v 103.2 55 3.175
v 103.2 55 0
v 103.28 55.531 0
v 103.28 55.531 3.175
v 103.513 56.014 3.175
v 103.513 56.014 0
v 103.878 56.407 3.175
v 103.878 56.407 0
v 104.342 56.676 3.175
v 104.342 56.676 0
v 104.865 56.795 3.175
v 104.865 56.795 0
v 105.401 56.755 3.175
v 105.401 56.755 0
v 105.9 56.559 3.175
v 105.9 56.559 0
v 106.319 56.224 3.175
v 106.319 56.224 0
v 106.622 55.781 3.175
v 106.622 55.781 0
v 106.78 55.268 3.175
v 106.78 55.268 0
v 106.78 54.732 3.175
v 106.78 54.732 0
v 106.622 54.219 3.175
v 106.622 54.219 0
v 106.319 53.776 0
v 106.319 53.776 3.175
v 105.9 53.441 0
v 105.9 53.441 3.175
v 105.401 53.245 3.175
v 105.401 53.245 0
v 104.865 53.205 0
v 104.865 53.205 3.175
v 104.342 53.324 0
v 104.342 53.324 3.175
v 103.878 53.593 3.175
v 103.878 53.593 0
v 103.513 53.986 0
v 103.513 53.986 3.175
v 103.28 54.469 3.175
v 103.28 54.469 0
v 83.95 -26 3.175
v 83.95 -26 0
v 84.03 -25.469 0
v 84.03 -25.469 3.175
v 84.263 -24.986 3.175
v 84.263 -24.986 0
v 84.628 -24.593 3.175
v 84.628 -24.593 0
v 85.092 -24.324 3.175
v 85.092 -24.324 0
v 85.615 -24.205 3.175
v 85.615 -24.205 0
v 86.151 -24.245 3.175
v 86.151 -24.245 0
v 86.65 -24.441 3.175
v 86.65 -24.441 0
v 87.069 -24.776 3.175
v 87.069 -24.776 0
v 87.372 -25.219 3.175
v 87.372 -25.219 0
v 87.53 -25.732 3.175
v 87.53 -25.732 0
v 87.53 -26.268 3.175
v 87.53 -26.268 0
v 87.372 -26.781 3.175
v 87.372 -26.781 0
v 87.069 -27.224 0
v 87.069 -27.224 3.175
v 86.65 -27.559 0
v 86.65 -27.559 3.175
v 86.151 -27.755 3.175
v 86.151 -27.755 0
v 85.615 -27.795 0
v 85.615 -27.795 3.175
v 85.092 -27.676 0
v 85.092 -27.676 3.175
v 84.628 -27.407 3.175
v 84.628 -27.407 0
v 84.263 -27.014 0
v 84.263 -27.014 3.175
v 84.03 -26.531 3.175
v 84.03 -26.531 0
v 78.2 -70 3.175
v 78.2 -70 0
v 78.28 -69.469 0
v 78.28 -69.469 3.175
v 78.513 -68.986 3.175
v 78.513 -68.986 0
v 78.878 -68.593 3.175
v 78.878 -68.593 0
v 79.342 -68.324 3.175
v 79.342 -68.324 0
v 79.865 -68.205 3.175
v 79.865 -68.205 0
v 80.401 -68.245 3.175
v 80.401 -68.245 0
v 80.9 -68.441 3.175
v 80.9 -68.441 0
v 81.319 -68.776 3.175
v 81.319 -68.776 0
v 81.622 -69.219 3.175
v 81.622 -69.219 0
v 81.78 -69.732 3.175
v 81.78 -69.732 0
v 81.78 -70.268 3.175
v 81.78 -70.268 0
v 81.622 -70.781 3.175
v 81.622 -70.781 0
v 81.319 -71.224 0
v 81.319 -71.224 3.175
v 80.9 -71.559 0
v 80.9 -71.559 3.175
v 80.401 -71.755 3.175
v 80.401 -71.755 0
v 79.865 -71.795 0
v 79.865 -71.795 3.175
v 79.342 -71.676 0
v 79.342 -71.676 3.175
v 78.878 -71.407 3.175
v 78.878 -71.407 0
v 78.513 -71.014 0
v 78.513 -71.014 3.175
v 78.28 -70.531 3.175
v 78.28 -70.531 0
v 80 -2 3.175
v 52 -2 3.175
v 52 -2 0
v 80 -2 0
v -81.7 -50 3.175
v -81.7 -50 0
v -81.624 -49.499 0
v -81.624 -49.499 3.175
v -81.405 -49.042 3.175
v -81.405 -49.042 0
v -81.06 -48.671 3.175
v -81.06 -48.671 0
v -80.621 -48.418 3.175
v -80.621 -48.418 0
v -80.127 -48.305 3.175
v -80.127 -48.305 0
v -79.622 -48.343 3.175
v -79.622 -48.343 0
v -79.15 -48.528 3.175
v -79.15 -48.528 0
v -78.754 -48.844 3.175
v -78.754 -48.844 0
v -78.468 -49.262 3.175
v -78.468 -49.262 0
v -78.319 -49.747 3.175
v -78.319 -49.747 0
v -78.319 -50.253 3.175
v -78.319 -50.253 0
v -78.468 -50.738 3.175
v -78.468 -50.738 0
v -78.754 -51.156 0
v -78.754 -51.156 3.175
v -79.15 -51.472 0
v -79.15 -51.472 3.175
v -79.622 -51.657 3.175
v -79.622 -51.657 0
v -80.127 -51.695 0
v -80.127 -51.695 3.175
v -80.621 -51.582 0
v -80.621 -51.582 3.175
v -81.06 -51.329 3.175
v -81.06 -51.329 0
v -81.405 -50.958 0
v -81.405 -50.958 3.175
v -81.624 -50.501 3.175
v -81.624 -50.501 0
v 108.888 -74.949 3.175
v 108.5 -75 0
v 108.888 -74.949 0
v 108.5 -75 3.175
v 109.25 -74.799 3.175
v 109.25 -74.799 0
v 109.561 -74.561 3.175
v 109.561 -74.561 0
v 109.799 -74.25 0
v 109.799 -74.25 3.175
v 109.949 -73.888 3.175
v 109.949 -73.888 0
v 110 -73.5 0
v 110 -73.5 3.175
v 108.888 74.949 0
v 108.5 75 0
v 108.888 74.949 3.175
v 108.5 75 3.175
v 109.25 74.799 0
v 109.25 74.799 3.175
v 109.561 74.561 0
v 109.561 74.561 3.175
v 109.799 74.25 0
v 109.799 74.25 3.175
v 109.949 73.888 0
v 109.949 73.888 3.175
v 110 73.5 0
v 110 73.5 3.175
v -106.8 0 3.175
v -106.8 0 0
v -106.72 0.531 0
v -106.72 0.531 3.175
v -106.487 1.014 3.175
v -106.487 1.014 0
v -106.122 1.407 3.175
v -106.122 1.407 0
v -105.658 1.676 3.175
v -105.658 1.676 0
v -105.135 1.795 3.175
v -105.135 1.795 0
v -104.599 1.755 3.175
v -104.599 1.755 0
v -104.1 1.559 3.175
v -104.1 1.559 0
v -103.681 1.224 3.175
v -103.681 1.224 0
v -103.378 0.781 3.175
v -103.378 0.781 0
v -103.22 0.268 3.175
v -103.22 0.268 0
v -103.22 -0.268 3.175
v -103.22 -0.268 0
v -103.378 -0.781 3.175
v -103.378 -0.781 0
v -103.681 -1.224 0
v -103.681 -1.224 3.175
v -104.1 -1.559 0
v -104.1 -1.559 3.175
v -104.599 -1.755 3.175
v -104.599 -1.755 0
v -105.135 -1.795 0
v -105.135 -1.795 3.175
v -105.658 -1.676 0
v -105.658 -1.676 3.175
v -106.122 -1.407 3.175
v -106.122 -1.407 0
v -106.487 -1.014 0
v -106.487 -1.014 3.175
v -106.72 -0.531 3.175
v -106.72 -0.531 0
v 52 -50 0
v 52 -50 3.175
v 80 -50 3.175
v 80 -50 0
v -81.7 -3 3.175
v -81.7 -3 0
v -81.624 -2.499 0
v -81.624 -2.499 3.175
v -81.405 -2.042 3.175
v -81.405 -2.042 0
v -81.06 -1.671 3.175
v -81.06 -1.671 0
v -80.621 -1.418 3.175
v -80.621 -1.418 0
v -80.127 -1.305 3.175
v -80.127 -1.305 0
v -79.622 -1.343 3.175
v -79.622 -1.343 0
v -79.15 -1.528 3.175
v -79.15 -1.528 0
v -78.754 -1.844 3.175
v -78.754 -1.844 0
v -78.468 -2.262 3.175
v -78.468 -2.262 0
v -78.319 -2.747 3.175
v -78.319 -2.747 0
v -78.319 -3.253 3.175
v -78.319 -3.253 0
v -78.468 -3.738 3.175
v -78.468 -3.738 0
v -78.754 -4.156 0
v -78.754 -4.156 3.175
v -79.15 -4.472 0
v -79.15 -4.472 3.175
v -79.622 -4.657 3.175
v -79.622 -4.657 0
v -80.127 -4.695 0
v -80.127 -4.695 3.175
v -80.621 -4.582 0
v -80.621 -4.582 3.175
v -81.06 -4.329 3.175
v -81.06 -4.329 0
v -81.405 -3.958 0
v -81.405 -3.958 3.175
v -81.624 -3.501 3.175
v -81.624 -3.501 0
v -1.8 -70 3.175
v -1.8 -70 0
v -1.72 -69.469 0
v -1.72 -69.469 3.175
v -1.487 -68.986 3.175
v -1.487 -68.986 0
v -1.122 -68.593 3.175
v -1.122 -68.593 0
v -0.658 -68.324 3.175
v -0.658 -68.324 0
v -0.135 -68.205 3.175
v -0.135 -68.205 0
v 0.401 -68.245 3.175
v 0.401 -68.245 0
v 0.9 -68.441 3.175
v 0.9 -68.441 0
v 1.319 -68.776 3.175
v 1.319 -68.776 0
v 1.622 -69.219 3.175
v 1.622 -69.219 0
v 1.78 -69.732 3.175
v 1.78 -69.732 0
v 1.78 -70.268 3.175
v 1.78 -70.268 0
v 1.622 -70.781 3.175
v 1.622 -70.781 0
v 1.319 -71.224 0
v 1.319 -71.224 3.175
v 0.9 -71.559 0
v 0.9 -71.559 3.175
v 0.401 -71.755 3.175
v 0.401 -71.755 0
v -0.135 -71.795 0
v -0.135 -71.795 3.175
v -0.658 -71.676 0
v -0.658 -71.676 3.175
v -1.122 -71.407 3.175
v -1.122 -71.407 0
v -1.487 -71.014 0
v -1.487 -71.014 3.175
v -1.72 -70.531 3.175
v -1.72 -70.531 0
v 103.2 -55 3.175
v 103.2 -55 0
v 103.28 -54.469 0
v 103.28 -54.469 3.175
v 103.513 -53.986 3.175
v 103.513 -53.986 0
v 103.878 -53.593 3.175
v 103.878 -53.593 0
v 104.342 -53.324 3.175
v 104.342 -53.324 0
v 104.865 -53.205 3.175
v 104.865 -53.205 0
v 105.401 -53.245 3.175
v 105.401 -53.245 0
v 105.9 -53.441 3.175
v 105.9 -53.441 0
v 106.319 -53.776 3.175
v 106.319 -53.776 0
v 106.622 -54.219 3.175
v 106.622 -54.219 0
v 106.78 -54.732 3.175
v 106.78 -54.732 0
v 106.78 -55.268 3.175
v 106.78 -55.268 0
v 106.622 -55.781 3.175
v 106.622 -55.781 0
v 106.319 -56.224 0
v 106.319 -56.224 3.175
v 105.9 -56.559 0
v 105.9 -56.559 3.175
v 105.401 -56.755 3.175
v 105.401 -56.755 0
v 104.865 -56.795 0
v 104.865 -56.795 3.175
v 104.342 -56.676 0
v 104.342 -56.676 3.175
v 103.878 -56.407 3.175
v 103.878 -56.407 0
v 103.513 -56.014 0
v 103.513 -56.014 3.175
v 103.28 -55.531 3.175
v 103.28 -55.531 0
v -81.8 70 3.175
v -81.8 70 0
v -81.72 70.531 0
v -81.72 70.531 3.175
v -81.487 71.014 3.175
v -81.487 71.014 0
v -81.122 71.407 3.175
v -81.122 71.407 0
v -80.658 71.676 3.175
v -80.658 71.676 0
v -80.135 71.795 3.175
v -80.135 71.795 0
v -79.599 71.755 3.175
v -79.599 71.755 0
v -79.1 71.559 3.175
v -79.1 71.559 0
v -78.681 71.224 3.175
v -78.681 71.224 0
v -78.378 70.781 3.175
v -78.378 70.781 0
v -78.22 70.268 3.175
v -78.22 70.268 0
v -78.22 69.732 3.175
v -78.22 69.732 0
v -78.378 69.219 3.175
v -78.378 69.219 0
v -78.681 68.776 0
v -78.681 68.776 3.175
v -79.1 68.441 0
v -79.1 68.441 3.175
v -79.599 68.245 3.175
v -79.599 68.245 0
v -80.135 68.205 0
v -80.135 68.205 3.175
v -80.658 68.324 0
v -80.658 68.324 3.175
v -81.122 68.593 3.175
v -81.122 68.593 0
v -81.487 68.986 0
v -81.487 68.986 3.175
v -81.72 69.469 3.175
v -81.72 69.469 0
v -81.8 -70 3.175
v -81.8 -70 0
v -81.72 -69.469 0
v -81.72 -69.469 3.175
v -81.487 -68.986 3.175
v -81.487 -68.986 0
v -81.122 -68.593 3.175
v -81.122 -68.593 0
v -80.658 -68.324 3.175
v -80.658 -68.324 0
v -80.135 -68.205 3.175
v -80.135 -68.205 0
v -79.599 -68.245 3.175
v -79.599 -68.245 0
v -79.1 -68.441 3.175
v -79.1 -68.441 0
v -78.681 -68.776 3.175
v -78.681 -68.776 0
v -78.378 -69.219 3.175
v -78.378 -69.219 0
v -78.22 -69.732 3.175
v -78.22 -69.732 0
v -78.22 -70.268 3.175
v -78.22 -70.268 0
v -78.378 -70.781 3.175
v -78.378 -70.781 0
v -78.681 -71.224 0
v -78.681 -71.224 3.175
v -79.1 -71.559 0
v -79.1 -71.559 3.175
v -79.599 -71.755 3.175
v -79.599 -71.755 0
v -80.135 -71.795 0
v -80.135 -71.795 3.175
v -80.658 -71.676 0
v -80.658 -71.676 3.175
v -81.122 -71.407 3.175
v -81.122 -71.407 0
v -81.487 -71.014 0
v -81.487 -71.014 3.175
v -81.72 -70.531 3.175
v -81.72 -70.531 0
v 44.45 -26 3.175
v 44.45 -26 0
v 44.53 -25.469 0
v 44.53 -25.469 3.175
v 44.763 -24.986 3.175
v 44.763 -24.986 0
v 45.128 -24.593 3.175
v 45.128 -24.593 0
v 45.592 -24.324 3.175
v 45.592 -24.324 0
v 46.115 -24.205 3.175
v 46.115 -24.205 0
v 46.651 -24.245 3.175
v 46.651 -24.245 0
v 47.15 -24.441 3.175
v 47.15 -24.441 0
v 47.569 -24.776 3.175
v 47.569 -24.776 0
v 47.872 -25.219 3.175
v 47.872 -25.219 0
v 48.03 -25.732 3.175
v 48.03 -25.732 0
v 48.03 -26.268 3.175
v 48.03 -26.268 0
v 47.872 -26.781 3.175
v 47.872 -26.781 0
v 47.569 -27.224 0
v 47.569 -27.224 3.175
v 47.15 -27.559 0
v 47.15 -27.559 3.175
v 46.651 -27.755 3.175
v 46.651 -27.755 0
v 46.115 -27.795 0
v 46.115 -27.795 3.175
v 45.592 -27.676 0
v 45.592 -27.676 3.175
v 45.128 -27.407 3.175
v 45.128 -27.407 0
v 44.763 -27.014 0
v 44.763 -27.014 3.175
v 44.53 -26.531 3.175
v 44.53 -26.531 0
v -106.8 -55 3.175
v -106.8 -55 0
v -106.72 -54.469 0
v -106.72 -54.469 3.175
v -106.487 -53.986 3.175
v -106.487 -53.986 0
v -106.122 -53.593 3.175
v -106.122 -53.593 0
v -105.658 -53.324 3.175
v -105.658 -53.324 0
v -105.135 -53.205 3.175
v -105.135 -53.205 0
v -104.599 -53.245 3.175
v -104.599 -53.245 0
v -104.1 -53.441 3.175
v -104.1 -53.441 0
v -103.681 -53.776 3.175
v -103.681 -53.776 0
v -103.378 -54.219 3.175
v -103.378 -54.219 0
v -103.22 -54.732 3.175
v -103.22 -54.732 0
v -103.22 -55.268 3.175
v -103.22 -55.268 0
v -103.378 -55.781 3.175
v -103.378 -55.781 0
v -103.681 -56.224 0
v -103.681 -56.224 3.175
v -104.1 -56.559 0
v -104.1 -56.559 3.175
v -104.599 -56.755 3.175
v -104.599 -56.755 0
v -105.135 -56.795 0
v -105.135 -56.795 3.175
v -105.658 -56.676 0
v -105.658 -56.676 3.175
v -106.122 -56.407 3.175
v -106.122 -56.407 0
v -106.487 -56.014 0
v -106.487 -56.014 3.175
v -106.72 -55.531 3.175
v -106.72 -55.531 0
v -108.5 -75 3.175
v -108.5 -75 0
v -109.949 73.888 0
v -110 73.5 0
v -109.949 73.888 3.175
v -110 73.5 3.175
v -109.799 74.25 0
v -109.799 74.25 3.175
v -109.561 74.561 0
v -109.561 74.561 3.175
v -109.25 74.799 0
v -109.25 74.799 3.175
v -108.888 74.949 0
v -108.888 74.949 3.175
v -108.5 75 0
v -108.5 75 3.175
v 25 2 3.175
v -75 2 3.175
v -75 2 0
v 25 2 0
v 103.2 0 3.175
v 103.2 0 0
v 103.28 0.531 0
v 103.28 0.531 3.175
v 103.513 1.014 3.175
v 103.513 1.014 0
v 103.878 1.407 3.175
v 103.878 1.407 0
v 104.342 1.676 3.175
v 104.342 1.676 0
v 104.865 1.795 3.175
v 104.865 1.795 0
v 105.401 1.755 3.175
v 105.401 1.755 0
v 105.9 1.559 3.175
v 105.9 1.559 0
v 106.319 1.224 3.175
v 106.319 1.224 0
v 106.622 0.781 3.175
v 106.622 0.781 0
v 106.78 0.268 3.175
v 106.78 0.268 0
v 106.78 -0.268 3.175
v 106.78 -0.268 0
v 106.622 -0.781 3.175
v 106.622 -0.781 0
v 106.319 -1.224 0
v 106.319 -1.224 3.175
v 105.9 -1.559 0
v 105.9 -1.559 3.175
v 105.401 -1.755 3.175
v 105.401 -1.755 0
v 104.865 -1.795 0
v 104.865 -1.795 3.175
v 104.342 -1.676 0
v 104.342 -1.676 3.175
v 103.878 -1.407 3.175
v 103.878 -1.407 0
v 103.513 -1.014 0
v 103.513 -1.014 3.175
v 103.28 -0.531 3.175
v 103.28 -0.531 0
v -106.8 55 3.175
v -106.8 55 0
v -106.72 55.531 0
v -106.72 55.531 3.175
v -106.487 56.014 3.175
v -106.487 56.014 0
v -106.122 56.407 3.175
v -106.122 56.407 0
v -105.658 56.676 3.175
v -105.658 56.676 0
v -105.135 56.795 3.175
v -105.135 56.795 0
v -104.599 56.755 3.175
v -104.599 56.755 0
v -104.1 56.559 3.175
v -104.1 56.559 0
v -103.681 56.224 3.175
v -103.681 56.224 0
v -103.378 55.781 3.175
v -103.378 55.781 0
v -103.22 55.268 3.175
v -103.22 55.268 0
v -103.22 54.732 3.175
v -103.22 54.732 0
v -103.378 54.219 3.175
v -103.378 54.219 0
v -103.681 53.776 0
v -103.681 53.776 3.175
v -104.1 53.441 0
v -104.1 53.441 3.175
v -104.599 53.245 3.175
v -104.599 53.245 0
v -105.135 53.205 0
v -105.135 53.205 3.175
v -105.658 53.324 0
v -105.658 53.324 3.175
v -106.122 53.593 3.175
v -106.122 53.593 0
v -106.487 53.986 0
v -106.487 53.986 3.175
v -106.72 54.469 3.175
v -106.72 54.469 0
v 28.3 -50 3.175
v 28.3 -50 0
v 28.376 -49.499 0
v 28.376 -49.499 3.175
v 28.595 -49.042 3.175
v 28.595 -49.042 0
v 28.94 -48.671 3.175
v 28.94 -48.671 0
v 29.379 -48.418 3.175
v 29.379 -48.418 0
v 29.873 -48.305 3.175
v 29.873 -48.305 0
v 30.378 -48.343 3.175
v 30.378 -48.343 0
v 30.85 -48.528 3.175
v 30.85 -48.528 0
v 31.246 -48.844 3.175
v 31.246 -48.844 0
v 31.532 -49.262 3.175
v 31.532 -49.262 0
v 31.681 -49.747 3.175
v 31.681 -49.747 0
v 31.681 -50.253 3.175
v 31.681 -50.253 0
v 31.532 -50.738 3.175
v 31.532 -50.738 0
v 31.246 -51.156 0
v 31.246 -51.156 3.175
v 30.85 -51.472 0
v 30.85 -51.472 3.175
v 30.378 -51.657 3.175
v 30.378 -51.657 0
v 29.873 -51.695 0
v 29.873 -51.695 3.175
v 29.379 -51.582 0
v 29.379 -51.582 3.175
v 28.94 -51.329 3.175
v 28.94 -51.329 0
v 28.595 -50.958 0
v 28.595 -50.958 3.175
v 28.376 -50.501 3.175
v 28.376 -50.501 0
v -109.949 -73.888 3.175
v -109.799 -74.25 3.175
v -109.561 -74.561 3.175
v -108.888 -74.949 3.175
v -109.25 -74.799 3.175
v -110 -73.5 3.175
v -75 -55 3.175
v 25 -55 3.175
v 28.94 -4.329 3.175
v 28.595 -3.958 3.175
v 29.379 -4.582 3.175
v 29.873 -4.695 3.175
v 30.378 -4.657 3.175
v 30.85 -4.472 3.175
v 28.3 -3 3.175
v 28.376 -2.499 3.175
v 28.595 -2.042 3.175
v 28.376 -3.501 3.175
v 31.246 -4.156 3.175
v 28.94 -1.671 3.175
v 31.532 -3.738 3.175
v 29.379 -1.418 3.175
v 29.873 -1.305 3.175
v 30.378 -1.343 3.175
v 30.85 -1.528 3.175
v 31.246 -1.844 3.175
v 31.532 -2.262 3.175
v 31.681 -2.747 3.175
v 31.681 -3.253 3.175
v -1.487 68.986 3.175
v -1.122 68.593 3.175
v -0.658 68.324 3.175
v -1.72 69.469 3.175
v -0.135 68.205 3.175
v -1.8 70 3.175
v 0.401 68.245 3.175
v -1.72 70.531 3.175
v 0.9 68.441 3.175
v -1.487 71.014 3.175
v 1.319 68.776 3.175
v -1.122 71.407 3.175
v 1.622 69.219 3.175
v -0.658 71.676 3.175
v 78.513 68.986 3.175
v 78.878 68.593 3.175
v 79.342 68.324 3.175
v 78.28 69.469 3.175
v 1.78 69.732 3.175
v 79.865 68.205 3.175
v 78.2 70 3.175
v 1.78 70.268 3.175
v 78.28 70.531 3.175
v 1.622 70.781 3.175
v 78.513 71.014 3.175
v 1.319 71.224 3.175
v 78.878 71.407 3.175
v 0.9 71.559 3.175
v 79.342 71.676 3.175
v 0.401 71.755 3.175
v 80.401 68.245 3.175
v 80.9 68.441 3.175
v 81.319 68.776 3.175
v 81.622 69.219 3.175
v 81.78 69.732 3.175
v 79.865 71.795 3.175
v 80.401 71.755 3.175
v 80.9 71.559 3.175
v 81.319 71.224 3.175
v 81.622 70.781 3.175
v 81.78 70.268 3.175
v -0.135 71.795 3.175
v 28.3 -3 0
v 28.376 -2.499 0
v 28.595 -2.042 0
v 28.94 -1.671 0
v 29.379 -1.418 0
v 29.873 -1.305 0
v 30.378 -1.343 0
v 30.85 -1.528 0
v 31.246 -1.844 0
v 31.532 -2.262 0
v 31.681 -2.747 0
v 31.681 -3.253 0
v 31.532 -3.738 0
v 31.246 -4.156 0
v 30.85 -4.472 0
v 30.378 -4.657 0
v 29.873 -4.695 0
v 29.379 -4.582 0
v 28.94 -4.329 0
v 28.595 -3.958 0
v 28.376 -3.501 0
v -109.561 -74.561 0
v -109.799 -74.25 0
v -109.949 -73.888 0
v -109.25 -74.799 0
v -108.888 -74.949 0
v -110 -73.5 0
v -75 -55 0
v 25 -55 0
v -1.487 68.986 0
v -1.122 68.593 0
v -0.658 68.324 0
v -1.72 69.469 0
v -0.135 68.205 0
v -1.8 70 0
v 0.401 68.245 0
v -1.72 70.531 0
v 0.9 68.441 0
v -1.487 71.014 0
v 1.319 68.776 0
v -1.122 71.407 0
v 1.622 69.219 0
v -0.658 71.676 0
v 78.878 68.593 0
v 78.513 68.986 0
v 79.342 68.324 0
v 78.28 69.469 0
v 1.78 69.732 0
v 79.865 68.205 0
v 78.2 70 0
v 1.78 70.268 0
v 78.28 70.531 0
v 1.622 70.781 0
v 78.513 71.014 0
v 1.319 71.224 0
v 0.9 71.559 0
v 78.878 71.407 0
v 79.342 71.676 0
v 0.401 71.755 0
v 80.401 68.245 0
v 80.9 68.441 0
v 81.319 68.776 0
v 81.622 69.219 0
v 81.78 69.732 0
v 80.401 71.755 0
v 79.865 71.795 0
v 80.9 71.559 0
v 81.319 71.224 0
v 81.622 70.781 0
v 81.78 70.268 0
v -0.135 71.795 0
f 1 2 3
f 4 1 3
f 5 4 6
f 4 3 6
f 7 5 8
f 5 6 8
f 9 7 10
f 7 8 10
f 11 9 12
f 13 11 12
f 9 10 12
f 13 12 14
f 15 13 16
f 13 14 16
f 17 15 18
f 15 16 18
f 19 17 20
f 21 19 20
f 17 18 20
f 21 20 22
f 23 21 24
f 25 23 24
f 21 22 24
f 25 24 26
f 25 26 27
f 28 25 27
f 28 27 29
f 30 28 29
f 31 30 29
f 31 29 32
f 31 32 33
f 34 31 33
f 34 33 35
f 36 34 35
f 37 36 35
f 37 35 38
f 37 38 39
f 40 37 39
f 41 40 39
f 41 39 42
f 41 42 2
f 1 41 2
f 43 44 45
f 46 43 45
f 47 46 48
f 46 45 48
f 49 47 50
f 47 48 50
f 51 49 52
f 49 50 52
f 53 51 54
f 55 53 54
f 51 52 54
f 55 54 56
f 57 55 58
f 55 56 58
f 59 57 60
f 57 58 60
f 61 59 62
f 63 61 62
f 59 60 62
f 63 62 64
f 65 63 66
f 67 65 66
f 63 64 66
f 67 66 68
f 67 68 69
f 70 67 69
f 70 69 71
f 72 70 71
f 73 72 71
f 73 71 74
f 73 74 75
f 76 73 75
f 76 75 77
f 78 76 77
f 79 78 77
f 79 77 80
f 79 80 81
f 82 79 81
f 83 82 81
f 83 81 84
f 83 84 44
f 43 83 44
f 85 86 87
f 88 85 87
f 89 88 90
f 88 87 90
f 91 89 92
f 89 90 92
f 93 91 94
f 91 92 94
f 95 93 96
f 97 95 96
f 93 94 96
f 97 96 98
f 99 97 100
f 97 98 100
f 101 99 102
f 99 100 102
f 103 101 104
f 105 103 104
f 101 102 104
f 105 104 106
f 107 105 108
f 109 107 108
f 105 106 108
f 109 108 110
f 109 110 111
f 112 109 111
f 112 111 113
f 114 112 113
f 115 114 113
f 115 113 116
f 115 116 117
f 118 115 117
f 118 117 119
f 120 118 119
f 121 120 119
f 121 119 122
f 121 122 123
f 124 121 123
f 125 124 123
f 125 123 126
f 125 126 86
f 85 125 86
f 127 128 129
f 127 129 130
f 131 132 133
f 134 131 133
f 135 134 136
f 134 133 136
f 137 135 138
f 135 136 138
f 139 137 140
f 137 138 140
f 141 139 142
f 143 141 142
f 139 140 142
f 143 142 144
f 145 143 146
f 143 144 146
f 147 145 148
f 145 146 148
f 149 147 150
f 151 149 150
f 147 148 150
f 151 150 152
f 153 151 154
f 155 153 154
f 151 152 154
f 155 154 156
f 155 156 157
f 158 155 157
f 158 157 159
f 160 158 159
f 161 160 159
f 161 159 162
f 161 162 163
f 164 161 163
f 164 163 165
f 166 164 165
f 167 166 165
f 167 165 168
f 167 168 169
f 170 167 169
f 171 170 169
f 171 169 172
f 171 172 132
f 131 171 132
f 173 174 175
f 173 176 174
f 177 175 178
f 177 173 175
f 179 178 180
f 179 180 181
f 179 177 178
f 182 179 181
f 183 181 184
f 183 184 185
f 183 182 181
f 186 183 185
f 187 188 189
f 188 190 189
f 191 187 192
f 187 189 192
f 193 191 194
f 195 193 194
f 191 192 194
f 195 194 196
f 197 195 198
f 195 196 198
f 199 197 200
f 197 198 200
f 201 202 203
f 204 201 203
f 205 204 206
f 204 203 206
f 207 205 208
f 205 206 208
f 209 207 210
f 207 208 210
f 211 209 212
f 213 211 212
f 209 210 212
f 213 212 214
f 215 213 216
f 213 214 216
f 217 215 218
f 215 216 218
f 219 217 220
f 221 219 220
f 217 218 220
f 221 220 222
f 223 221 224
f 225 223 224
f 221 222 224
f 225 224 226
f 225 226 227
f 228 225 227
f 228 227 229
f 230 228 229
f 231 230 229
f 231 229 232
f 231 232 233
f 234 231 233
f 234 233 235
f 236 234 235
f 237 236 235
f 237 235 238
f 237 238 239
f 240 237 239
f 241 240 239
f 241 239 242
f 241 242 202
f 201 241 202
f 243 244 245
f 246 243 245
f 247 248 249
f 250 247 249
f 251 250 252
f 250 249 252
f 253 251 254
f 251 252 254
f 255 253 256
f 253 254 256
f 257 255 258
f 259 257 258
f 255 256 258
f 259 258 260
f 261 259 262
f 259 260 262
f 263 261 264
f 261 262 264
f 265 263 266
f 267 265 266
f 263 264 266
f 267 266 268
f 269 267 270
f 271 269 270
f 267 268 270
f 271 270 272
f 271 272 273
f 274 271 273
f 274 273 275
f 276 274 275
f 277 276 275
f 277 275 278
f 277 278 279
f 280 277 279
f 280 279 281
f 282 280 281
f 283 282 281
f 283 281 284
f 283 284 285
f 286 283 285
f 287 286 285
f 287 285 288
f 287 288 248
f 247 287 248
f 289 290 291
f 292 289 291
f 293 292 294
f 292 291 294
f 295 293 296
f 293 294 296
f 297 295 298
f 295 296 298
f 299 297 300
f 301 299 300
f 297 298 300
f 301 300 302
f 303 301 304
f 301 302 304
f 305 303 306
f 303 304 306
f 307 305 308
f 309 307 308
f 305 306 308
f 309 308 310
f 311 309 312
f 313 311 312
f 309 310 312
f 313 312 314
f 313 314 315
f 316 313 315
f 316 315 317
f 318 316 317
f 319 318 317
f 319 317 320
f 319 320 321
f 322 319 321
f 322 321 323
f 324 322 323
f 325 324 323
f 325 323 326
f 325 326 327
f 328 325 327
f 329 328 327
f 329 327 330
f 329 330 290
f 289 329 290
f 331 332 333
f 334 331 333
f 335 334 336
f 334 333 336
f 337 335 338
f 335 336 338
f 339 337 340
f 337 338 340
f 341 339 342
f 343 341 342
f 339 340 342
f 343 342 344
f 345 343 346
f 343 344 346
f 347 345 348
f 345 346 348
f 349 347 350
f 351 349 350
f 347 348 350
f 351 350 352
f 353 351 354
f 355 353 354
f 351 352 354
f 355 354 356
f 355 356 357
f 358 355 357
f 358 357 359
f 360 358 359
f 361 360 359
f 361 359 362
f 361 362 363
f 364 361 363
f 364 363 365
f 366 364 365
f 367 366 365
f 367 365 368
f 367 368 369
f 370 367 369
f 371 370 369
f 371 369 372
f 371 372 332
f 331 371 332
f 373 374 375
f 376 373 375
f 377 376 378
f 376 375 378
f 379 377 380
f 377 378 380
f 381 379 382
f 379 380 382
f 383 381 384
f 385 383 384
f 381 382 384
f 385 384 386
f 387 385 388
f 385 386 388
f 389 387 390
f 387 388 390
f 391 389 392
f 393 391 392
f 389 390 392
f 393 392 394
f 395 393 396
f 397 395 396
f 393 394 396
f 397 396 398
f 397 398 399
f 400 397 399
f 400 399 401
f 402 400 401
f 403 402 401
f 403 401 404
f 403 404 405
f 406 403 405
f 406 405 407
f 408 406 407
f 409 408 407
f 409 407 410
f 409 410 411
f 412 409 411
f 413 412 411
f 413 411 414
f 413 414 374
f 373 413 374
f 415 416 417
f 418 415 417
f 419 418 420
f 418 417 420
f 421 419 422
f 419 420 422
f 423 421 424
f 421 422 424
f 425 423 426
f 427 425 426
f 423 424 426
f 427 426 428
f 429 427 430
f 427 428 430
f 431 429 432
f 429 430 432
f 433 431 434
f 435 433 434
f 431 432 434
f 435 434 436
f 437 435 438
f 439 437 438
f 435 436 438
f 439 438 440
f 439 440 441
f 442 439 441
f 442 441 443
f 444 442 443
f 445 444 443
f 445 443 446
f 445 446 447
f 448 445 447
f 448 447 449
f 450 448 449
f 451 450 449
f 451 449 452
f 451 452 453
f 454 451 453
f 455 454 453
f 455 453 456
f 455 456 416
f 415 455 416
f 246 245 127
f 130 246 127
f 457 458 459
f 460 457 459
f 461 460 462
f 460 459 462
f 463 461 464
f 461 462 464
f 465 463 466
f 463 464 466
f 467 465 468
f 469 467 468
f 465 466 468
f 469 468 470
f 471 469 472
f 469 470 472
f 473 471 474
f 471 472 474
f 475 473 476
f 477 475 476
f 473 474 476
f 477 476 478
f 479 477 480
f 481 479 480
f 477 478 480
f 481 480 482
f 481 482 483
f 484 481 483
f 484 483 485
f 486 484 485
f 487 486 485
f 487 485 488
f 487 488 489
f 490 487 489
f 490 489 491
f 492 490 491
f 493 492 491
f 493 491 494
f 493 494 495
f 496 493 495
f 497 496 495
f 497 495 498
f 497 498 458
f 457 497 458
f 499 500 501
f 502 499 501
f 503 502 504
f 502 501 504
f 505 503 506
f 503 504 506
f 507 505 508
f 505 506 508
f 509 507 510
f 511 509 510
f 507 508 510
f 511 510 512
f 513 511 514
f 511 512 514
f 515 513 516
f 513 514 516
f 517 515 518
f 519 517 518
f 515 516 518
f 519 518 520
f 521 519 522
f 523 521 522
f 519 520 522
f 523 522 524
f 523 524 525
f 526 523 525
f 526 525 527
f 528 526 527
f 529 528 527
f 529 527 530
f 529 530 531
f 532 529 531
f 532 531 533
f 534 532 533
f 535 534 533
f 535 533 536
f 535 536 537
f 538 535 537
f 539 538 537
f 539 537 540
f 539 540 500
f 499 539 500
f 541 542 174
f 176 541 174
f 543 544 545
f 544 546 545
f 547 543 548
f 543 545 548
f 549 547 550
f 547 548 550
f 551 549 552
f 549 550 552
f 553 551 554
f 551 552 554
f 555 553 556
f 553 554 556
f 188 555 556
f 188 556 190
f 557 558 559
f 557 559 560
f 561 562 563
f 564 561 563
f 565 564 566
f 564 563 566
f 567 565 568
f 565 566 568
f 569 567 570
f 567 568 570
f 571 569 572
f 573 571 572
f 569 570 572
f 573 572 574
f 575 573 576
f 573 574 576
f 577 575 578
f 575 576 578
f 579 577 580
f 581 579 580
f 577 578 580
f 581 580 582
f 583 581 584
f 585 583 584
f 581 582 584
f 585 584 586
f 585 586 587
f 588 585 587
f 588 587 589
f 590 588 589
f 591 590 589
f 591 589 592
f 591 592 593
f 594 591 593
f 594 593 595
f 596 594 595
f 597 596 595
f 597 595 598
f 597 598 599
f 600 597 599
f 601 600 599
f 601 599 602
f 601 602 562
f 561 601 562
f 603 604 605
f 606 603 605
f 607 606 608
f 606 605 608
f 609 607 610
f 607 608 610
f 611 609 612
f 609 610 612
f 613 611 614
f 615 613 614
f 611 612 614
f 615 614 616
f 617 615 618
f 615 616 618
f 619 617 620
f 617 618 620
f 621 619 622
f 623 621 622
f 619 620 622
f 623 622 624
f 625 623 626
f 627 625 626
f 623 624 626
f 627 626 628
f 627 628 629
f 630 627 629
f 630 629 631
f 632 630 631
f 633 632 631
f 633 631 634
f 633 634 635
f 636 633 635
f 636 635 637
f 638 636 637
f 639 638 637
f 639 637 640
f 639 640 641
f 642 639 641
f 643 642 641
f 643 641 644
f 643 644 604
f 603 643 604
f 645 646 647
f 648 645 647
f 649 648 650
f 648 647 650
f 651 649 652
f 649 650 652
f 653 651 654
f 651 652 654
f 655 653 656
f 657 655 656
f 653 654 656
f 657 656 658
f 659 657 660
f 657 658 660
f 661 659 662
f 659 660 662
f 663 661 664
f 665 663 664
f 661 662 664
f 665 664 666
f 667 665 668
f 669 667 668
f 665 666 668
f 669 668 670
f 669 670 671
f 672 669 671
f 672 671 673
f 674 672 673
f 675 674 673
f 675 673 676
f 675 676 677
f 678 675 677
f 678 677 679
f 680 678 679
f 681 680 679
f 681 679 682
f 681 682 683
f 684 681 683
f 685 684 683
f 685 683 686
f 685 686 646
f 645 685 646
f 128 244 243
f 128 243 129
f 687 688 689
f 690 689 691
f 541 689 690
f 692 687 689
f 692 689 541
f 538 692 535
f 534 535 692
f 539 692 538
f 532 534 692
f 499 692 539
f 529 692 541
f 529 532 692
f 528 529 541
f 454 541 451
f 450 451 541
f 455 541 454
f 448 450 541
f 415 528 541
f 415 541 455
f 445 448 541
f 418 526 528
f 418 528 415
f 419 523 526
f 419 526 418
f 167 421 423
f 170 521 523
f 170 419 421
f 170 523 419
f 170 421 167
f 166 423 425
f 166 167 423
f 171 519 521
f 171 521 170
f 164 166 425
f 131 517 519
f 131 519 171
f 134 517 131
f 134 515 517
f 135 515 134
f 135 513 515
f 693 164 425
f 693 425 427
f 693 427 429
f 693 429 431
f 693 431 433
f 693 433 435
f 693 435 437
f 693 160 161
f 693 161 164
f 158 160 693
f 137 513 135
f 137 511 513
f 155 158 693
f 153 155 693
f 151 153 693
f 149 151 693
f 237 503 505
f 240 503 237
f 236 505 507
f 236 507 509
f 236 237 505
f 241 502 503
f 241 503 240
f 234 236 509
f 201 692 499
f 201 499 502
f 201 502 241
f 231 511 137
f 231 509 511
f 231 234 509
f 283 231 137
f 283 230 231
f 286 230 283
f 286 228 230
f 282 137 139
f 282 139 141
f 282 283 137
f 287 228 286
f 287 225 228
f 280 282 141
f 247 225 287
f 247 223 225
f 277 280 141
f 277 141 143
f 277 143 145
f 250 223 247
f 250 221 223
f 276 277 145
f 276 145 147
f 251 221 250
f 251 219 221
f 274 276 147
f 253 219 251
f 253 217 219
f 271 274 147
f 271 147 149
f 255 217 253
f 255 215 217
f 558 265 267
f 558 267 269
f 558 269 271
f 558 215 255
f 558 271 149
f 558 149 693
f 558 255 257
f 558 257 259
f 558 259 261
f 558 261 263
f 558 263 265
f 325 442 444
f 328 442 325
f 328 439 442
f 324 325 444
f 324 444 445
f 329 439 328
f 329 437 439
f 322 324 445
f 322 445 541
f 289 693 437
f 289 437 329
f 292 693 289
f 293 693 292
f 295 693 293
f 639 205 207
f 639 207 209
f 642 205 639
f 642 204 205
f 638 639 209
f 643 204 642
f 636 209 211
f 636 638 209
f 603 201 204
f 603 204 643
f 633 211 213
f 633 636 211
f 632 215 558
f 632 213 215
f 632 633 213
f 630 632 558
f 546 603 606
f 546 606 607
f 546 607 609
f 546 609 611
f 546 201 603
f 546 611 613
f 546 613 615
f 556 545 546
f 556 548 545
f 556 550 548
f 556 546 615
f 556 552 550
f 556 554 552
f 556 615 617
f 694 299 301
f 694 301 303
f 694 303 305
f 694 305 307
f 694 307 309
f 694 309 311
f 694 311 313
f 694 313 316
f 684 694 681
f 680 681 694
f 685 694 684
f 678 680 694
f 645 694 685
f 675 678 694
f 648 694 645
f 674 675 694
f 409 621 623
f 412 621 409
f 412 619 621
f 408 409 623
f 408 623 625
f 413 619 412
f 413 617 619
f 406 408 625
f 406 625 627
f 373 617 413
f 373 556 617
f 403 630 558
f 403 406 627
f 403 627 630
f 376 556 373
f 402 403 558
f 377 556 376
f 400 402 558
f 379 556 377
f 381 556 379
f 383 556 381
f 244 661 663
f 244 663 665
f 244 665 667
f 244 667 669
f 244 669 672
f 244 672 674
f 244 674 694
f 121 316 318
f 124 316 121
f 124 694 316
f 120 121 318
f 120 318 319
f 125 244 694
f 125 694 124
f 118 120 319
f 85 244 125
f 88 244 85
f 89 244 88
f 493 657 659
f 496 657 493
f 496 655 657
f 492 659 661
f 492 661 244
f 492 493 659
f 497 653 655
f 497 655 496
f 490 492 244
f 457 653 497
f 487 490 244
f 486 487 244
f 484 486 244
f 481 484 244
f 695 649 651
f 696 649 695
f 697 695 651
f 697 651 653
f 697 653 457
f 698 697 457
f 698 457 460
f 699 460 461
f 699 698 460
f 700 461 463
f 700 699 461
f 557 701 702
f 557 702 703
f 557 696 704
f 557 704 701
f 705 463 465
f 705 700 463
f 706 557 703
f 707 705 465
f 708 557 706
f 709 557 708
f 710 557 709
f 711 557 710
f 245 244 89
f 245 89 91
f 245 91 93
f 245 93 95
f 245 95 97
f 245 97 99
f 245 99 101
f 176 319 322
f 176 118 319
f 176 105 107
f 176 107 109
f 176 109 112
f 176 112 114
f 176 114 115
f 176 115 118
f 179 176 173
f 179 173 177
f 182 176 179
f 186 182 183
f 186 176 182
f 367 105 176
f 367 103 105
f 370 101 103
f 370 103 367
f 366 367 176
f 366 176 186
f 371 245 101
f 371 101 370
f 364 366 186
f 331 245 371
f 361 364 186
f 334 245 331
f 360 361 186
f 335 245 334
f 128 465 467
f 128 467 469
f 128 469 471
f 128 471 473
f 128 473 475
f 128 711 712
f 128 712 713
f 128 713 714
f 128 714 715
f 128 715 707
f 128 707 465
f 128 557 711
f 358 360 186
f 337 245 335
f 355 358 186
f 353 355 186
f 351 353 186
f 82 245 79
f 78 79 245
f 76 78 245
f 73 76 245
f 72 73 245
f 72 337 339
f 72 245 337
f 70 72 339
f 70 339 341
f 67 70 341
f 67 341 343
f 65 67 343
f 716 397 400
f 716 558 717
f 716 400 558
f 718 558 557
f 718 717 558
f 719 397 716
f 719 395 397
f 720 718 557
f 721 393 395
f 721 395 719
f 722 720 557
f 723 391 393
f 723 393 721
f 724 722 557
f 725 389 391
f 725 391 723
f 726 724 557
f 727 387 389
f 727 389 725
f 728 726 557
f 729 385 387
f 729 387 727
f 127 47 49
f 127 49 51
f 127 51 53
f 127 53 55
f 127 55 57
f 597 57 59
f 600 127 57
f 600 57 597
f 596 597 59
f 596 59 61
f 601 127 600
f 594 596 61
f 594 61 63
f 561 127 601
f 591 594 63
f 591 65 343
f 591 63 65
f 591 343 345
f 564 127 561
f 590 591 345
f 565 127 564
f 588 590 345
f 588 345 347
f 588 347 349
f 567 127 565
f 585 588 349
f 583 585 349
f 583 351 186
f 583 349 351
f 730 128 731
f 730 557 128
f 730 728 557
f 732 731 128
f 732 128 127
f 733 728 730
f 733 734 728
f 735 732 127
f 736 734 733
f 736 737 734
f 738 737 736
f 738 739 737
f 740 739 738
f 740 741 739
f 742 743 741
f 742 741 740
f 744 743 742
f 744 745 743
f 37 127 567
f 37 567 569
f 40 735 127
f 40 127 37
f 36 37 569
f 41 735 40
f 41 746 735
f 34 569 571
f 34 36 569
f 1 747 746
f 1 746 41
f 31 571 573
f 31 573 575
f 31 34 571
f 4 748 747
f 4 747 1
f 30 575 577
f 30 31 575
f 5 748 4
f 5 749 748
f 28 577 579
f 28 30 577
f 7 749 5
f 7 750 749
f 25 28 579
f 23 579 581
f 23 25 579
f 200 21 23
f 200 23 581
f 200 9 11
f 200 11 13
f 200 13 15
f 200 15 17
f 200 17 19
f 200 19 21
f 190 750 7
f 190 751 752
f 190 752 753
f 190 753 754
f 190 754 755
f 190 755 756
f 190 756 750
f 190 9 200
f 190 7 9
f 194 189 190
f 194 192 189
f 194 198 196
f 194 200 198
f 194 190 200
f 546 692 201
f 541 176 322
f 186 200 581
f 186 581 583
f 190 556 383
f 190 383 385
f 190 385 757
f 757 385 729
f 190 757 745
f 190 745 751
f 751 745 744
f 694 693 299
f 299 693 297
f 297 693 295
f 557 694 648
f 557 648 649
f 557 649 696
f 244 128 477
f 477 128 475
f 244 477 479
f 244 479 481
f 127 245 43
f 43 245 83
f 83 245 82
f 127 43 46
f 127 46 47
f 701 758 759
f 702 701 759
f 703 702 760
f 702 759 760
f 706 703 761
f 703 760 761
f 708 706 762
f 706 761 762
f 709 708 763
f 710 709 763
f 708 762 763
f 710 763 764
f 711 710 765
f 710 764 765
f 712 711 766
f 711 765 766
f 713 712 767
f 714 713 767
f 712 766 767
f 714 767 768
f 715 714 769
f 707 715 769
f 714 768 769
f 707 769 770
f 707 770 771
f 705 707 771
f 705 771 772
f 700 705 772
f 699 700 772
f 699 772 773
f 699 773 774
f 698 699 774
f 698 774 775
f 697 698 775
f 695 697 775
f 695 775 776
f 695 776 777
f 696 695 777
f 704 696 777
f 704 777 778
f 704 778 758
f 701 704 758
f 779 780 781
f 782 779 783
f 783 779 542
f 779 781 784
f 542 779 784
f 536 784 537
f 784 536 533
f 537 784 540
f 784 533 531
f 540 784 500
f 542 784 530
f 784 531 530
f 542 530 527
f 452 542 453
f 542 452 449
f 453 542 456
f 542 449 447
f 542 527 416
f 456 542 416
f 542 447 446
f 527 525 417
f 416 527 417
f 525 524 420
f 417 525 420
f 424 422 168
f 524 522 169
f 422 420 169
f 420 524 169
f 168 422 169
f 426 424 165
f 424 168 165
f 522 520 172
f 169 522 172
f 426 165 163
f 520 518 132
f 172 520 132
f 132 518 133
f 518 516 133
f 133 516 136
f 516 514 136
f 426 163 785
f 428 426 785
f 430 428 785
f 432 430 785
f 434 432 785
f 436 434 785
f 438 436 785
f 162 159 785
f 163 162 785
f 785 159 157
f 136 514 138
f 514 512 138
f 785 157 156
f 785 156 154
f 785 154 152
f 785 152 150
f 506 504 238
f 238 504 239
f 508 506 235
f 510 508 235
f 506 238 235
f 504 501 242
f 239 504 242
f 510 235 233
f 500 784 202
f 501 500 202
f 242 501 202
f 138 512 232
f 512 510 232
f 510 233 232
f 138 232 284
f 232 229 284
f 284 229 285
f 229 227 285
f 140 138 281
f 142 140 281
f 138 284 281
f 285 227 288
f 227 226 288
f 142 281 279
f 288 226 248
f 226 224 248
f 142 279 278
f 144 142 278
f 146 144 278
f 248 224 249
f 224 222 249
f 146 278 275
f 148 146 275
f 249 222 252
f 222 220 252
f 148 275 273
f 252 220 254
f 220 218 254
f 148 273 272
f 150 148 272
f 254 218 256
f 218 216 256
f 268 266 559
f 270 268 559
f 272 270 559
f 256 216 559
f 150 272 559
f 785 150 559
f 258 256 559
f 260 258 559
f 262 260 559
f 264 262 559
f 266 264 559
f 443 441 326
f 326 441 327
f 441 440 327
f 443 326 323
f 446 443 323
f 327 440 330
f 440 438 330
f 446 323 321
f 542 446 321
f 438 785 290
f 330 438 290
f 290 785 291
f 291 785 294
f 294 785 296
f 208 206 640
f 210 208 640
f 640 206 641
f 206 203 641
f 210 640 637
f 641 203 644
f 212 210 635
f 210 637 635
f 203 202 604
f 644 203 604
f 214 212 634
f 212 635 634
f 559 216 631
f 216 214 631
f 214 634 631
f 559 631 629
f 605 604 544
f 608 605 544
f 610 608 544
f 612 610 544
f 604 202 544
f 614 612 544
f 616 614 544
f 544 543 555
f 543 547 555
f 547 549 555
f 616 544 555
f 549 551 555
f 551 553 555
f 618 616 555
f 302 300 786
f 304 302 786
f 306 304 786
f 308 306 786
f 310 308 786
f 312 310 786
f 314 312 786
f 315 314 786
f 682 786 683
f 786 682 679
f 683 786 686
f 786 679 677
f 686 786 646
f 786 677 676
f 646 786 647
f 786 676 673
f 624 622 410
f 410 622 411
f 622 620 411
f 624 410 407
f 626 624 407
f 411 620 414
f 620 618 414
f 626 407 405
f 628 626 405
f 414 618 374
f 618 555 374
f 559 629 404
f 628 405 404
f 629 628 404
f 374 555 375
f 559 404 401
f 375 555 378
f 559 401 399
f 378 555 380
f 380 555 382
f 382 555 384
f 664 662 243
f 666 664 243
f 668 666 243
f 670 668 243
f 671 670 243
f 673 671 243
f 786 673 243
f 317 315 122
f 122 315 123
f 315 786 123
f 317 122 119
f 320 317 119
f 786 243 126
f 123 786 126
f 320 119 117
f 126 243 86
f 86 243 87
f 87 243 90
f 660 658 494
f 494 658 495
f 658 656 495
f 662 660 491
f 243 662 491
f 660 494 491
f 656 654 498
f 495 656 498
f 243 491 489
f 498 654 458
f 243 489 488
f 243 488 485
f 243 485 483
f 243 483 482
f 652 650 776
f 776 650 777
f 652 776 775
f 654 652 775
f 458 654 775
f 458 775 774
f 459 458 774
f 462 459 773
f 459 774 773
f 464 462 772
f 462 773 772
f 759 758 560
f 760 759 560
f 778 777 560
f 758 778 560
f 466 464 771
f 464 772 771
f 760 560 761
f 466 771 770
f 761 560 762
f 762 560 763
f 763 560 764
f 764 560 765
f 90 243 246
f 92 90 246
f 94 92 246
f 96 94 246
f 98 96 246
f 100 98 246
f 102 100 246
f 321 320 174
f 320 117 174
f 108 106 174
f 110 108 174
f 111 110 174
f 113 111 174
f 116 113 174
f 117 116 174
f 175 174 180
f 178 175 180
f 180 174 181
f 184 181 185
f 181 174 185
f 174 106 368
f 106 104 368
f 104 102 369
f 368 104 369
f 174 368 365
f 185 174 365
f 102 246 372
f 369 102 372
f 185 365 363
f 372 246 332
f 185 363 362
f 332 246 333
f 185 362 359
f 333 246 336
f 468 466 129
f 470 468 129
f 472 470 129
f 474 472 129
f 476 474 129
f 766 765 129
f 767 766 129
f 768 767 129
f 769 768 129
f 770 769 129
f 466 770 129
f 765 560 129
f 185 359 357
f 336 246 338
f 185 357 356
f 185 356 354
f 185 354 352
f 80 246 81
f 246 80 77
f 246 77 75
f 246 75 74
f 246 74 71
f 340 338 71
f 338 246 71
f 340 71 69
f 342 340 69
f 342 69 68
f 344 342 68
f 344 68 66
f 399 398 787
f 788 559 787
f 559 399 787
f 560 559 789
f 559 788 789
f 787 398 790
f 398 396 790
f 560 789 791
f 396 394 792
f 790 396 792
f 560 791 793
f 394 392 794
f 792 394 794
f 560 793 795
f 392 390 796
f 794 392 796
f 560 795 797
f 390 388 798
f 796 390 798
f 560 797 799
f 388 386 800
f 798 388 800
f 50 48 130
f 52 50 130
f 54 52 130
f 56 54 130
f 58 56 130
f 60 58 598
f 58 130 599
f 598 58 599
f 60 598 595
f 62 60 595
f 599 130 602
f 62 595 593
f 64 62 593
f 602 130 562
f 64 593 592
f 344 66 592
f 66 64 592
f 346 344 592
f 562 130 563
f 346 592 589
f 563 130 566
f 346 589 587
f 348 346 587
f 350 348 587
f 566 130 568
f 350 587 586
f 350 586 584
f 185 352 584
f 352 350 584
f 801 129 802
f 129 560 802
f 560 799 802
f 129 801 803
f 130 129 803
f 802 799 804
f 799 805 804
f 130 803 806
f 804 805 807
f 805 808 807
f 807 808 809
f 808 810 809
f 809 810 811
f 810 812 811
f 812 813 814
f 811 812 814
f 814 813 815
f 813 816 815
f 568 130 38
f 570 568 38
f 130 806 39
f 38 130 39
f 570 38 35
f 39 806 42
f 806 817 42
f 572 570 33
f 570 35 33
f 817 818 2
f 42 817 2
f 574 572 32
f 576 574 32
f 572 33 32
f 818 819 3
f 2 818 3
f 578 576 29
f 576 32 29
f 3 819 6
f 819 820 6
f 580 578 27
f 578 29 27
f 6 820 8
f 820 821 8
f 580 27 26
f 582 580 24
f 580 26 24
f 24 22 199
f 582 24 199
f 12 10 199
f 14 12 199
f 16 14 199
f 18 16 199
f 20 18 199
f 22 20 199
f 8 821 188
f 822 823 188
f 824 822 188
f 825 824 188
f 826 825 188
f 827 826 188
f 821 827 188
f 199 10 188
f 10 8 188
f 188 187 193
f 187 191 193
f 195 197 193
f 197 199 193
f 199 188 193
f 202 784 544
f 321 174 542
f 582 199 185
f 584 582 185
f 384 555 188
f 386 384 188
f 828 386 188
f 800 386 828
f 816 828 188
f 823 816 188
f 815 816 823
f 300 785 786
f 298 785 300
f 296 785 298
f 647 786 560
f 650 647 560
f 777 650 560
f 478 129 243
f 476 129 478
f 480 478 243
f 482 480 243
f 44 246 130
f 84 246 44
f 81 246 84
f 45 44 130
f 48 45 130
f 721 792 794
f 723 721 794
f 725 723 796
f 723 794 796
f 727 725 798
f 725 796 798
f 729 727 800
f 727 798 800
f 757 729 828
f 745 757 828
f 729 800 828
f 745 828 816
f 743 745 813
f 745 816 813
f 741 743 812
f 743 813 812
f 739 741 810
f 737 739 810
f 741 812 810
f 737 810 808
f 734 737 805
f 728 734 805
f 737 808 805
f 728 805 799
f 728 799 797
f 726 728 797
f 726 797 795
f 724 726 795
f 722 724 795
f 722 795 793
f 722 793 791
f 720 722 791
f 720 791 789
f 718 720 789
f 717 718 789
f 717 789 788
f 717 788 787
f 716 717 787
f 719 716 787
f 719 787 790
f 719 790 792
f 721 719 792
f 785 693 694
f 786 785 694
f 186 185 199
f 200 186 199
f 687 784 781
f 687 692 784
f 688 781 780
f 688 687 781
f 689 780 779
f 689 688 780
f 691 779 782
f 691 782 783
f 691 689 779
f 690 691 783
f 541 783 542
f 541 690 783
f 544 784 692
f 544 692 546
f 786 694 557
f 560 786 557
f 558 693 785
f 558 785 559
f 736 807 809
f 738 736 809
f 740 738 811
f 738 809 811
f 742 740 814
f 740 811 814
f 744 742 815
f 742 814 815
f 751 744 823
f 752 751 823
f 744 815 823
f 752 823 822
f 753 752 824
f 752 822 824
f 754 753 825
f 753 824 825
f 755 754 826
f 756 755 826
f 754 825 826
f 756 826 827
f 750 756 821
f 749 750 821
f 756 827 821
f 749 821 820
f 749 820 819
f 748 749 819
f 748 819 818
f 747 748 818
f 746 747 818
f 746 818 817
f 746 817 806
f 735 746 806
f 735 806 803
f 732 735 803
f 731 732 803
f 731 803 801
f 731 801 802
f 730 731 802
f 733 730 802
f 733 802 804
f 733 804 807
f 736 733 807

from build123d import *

# Parameters (mm, degrees)
SKETCH1_W            = 220
SKETCH1_H            = 150
BOSS_EXTRUDE1_DEPTH  = 3.175
M3_CLEARANCE_HOLE1_D = 3.6
SKETCH4_W            = 10
SKETCH4_H            = 10
BOSS_EXTRUDE2_DEPTH  = 3.175
FILLET2_R            = 1.5
SKETCH5_W            = 28
SKETCH5_H            = 48
CUT_EXTRUDE1_DEPTH   = 4.175
M3_CLEARANCE_HOLE2_D = 3.6
SKETCH8_W            = 100
SKETCH8_H            = 57
CUT_EXTRUDE2_DEPTH   = 4.175
M3_CLEARANCE_HOLE3_D = 3.4


with BuildPart() as part:
    # Sketch1 → Boss-Extrude1 (new body)
    with BuildSketch(Plane.XY):
        Rectangle(SKETCH1_W, SKETCH1_H)
    extrude(amount=BOSS_EXTRUDE1_DEPTH)

    # M3 Clearance Hole1 (through all)
    with Locations(Plane.XY.offset(3.175)):
        with Locations((0, 0), (-80, 70), (80, 70), (0, 70), (-105, 55), (-105, 0), (-105, -55), (-80, -70), (0, -70), (80, -70), (105, -55), (105, 0), (105, 55)):
            Hole(M3_CLEARANCE_HOLE1_D / 2)

    # Sketch4 → Boss-Extrude2 (add, through all)
    with BuildSketch(Plane.XY.offset(3.175)):
        Rectangle(SKETCH4_W, SKETCH4_H)
    extrude(amount=-BOSS_EXTRUDE2_DEPTH)

    # Fillet2
    fillet2_edges = [part.edges().sort_by_distance(p)[0] for p in [
        (-110, -75, 1.5875),
        (-110, 75, 1.5875),
        (110, 75, 1.5875),
        (110, -75, 1.5875),
    ]]
    fillet(fillet2_edges, radius=FILLET2_R)

    # Sketch5 → Cut-Extrude1 (cut, through all)
    with BuildSketch(Plane.XY.offset(3.175)):
        with Locations((66, -26)):
            Rectangle(SKETCH5_W, SKETCH5_H)
    extrude(amount=-CUT_EXTRUDE1_DEPTH, mode=Mode.SUBTRACT)

    # M3 Clearance Hole2 (through all)
    with Locations(Plane.XY.offset(3.175)):
        with Locations((46.25, -26), (85.75, -26)):
            Hole(M3_CLEARANCE_HOLE2_D / 2)

    # Sketch8 → Cut-Extrude2 (cut, through all)
    with BuildSketch(Plane.XY.offset(3.175)):
        with Locations((-25, -26.5)):
            Rectangle(SKETCH8_W, SKETCH8_H)
    extrude(amount=-CUT_EXTRUDE2_DEPTH, mode=Mode.SUBTRACT)

    # M3 Clearance Hole3 (through all)
    with Locations(Plane.XY.offset(3.175)):
        with Locations((-80, -3), (-80, -50), (30, -50), (30, -3)):
            Hole(M3_CLEARANCE_HOLE3_D / 2)


solid = part.part
